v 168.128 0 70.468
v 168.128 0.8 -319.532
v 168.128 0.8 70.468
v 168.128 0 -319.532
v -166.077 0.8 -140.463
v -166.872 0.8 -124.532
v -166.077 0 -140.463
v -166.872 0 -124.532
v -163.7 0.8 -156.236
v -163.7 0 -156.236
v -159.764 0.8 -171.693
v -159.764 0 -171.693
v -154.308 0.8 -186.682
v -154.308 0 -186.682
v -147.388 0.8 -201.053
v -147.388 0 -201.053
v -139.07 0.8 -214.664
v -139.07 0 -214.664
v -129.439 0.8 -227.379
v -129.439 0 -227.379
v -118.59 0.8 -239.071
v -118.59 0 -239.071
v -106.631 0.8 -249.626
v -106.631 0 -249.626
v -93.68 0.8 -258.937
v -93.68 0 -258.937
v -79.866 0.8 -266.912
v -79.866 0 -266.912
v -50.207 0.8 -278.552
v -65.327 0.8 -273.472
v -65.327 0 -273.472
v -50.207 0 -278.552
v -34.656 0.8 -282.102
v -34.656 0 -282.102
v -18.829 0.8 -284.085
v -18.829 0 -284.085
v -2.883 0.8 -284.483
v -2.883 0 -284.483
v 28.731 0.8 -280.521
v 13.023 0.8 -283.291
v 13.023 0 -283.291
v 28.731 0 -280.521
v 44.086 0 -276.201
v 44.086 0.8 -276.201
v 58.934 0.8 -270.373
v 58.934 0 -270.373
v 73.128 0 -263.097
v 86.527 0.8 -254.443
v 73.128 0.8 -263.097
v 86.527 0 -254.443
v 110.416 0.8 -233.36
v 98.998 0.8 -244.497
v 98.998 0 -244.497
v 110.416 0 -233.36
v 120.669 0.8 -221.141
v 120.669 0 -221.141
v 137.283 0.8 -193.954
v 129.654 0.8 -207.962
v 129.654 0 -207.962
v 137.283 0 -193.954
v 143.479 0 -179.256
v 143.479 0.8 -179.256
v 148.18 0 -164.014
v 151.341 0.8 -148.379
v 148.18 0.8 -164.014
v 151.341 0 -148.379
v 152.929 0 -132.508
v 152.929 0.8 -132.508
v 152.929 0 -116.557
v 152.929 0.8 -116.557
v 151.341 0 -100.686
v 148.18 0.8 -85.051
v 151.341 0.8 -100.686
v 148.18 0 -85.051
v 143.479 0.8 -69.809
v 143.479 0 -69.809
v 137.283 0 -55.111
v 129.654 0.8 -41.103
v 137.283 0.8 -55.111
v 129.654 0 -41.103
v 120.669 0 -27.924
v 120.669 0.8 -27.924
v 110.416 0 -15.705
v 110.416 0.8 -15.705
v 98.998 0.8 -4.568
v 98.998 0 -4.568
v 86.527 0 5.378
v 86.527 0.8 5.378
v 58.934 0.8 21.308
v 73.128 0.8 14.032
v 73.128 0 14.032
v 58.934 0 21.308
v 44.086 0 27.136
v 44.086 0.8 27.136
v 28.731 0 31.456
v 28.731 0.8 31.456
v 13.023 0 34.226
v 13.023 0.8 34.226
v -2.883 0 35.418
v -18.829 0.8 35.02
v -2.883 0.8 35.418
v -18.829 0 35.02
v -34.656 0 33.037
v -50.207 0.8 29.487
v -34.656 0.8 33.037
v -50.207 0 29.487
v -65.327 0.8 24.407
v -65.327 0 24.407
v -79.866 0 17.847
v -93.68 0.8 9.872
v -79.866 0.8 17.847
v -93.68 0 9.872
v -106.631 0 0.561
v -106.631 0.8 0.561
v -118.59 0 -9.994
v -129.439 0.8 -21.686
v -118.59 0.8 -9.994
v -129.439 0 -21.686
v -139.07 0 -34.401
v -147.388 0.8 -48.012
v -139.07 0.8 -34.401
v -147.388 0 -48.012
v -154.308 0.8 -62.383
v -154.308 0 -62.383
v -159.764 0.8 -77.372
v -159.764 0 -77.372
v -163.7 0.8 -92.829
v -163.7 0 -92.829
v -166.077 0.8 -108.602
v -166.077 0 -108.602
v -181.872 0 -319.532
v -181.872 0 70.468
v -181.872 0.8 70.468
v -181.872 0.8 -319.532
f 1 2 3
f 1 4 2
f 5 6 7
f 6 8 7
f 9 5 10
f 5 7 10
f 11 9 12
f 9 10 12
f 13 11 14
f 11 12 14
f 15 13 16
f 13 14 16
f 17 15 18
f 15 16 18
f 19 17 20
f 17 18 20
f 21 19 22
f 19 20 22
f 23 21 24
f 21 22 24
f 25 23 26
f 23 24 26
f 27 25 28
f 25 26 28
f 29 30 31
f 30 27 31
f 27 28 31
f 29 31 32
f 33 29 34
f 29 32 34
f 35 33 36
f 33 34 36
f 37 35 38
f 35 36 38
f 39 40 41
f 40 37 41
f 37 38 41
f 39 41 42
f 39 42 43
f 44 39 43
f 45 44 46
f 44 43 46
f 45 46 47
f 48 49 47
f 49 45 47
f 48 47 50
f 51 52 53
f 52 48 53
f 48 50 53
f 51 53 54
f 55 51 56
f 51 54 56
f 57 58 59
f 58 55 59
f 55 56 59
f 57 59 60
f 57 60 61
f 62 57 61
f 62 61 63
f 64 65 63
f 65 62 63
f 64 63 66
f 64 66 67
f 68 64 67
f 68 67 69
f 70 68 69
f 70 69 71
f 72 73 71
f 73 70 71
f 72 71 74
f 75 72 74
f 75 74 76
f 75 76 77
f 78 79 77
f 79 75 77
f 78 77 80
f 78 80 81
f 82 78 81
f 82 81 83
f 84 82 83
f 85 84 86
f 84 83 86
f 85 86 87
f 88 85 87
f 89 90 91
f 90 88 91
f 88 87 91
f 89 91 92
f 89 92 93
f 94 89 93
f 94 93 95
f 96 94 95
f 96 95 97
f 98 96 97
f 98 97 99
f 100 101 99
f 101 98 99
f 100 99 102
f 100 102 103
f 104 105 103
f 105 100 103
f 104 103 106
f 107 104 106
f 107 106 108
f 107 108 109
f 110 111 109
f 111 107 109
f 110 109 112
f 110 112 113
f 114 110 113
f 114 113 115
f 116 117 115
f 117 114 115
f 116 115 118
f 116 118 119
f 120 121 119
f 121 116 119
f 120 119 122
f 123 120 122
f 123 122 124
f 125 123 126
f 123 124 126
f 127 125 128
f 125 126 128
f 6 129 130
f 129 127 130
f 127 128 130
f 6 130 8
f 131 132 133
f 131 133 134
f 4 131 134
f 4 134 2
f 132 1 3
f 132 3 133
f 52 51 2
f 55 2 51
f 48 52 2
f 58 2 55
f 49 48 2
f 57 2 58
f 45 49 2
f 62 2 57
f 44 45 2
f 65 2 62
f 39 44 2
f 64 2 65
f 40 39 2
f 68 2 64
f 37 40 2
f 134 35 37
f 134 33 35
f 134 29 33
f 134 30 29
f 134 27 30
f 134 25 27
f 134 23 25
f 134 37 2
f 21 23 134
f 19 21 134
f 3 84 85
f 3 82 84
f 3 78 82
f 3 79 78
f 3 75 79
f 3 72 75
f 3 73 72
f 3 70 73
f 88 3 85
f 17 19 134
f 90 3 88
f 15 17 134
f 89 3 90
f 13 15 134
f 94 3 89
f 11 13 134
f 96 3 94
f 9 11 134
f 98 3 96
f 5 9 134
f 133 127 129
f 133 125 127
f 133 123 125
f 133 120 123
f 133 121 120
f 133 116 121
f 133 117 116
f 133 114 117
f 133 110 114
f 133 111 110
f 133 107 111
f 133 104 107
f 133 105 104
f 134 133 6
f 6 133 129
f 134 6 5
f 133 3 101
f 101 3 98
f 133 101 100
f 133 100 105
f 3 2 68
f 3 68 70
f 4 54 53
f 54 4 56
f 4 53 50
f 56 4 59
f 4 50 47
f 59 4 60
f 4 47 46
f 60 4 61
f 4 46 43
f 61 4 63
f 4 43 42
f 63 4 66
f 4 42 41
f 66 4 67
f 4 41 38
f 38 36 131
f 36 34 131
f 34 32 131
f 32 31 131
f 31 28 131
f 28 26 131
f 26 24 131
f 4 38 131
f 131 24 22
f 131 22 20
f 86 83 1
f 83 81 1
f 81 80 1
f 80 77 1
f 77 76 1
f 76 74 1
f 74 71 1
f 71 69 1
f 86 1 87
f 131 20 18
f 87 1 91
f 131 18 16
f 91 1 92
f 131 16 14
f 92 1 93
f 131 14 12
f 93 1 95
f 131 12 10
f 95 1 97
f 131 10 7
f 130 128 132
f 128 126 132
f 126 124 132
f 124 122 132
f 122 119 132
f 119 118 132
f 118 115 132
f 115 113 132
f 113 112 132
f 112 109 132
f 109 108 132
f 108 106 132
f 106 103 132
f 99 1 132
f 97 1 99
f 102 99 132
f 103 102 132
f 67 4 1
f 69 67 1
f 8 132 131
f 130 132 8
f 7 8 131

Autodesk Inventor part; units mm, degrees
ref_plane "YZ Plane" through (0, 0, 0) normal (1, 0, 0) x (0, 1, 0)
ref_plane "XZ Plane" through (0, 0, 0) normal (0, 1, 0) x (-1, 0, 0)
ref_plane "XY Plane" through (0, 0, 0) normal (0, 0, 1) x (1, 0, 0)
sketch "Sketch1" plane through (0, 0, 0) normal (0, 1, 0) x (-1, 0, 0)
  line L0 (-168.1278, 70.4675) -> (181.8722, 70.4675)
  line L1 (181.8722, 70.4675) -> (181.8722, -319.5325)
  line L2 (181.8722, -319.5325) -> (-168.1278, -319.5325)
  line L3 (-168.1278, -319.5325) -> (-168.1278, 70.4675)
  circle A0 centre (6.8722, -124.5325) radius 160
  point P0 (0, 0)
  dimension "d0" = 350
  dimension "d1" = 390
  dimension "d2" = 320
extrude "Extrusion1" add sketch "Sketch1" along normal blind 0.8
properties part number "side350x390_hull"
